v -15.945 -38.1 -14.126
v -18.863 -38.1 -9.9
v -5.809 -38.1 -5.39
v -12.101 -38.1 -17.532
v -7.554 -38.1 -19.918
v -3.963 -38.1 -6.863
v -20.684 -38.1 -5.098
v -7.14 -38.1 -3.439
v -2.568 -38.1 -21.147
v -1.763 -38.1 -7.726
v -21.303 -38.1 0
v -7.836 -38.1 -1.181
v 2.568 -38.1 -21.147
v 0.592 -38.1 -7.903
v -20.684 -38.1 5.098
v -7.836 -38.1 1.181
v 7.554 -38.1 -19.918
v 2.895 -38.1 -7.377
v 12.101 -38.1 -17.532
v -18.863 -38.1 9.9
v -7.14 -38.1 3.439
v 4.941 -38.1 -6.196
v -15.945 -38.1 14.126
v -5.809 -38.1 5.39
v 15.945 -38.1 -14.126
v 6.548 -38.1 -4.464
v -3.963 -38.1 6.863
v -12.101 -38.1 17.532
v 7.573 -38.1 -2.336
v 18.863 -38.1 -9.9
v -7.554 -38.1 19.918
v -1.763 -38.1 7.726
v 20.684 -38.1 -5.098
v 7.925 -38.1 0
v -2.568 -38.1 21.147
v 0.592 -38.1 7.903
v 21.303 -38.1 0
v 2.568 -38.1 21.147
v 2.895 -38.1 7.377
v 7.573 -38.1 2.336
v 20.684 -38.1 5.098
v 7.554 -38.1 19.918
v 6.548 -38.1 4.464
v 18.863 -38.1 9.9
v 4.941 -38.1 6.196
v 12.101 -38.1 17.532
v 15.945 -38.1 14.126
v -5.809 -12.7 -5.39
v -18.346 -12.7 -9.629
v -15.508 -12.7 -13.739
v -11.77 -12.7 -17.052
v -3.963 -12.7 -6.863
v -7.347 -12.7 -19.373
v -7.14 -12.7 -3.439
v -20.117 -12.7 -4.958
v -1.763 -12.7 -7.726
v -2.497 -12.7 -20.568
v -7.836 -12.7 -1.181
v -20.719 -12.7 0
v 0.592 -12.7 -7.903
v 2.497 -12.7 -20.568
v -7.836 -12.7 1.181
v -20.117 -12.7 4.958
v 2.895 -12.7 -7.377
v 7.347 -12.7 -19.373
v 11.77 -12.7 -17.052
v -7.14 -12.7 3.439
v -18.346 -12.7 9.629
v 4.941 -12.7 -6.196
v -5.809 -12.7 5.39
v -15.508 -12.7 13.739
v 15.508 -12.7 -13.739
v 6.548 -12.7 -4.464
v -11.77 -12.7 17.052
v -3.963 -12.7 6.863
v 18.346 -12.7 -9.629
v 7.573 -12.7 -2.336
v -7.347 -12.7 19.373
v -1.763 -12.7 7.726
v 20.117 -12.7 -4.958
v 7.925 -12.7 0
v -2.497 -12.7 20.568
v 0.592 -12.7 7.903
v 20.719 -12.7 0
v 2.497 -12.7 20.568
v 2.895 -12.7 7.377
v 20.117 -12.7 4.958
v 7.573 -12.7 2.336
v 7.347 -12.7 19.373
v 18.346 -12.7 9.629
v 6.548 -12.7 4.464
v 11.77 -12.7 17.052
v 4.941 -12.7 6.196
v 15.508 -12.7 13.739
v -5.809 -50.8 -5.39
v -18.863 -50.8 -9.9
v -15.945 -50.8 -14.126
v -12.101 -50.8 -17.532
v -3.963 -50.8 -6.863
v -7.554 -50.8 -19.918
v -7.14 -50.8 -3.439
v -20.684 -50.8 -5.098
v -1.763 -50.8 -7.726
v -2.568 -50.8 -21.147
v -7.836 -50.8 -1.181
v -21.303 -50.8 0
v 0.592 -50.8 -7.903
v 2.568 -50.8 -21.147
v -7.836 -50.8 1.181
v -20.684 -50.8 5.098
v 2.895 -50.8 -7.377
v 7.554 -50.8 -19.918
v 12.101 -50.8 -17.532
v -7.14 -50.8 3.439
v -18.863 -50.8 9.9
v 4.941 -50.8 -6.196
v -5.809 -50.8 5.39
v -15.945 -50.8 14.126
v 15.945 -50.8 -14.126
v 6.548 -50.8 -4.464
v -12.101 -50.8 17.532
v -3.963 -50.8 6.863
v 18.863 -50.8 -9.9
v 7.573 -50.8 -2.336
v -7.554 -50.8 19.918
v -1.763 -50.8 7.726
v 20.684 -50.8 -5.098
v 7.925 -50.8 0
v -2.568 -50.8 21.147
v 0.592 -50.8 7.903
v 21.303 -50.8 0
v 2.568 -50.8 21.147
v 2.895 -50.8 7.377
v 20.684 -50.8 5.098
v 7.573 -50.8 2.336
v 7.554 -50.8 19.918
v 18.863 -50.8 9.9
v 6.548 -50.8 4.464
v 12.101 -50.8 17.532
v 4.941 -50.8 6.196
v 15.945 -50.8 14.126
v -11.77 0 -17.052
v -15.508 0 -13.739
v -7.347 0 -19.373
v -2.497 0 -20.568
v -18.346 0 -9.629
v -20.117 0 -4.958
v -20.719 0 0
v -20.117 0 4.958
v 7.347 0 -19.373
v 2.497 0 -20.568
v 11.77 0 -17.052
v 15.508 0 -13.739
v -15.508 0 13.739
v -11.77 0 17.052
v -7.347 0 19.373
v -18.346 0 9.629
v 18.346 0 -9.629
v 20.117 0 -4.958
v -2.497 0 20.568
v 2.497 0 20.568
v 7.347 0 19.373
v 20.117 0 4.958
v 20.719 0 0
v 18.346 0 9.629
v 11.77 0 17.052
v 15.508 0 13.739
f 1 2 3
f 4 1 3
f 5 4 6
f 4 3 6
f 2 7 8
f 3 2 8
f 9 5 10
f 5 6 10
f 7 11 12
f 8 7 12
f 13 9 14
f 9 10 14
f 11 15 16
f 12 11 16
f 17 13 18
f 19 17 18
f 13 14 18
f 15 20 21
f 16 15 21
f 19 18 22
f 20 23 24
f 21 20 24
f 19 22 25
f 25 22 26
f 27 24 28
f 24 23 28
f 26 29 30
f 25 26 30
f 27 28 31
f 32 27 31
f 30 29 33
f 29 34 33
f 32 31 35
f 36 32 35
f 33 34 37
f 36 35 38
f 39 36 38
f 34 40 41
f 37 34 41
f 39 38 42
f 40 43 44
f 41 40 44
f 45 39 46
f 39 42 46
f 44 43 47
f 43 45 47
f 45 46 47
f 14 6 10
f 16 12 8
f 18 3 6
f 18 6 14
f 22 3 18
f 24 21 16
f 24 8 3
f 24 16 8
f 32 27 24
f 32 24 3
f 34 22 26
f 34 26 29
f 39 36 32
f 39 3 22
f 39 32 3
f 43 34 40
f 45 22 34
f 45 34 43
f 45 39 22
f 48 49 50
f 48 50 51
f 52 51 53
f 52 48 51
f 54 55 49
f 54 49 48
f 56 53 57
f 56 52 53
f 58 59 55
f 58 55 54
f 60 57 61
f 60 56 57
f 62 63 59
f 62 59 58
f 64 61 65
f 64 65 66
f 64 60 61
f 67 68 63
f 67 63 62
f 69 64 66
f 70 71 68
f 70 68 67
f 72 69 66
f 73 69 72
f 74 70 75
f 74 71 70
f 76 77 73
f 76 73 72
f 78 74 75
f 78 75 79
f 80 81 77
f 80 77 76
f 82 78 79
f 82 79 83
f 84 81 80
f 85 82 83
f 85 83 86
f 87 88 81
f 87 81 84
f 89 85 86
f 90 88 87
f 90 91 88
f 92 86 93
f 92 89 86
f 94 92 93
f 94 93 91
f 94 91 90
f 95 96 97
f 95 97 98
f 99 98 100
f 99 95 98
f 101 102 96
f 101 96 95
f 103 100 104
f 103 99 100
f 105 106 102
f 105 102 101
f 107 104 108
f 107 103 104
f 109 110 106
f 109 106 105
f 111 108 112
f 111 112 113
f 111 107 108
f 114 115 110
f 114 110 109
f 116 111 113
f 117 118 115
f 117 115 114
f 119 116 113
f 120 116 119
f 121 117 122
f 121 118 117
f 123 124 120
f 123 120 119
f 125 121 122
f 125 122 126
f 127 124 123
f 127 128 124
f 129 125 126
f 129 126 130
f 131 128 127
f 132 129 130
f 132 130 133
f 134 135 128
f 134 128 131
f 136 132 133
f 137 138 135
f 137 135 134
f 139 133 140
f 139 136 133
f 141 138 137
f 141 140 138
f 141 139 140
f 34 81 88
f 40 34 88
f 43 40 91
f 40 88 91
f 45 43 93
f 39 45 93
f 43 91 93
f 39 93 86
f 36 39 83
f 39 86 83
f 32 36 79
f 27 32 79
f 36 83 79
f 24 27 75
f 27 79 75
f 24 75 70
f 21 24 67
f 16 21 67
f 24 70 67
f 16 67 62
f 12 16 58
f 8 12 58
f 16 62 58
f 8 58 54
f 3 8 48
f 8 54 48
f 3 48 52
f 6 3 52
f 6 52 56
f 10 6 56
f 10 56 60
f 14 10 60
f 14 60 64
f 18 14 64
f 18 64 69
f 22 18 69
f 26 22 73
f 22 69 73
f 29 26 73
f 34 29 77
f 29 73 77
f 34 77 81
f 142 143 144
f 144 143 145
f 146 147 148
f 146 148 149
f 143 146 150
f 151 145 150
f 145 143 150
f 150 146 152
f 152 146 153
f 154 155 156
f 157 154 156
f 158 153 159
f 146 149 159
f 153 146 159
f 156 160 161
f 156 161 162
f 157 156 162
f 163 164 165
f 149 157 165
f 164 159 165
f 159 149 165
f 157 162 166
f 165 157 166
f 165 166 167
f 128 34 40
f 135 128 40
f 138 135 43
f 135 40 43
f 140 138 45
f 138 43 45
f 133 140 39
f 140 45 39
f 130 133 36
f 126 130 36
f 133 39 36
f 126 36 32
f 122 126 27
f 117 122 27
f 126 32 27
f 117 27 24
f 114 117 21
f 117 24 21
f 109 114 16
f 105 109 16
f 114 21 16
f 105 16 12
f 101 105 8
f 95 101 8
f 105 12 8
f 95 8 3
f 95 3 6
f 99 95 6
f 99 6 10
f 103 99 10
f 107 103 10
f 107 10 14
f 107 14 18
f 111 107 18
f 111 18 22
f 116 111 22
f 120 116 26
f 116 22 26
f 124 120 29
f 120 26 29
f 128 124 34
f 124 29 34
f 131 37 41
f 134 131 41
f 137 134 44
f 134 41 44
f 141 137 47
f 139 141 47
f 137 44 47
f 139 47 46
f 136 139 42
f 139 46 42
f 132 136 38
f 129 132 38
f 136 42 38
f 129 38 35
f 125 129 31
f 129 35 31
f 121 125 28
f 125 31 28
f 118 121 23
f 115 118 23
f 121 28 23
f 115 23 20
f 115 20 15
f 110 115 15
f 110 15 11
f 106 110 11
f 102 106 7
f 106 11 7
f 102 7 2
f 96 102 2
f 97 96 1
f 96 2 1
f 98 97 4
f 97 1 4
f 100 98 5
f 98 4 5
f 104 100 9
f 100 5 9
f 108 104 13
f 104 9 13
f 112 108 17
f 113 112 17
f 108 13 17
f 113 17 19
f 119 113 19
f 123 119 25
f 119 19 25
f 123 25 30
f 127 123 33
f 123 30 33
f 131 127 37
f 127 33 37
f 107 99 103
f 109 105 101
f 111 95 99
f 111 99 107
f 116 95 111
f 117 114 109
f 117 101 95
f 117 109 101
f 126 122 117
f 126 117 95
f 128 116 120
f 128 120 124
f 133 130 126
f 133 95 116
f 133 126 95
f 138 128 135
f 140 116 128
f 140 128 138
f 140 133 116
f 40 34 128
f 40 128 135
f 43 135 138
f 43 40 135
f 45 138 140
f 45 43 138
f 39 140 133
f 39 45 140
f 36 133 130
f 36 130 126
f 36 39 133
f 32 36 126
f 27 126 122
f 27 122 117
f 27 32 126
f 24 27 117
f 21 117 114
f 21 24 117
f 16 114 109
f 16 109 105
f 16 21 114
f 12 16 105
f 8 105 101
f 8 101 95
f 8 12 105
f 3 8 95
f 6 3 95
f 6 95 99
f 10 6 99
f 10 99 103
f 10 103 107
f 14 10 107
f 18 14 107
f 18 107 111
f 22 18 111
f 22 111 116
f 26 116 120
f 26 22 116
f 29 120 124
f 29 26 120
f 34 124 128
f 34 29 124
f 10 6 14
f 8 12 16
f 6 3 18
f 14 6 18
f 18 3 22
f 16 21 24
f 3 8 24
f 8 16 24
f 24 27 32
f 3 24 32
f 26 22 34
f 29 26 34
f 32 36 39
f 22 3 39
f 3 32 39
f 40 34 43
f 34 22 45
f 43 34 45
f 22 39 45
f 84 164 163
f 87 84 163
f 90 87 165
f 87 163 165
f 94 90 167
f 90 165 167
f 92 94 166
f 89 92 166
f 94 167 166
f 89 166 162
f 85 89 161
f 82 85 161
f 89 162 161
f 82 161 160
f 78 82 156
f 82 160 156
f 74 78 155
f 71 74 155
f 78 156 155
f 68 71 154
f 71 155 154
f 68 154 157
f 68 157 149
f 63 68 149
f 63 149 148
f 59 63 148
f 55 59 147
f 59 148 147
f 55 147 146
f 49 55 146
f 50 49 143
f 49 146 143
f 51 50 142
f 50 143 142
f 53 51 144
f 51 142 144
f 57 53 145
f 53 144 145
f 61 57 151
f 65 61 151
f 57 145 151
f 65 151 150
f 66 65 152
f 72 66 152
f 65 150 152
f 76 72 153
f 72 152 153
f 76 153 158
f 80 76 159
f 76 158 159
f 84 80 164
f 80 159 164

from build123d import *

# Parameters (mm, degrees)
F0_R      = 20.719134
F1_DEPTH  = 12.7
F2_R      = 7.925002
F3_DEPTH  = 25.4
F4_R      = 21.302691
F4_R_2    = 7.925002
F5_DEPTH  = 12.7
F3_FACE_R = 7.925002
F6_DEPTH  = 12.7


with BuildPart() as f1:
    # F0 (on Front) → F1 (new body)
    with BuildSketch(Plane.XZ):
        Circle(F0_R)
    extrude(amount=F1_DEPTH)

    # F2 (on face) → F3 (join)
    with BuildSketch(Plane.XZ.offset(12.7)):
        Circle(F2_R)
    extrude(amount=F3_DEPTH)


with BuildPart() as f5:
    # F4 (on face) → F5 (new body)
    with BuildSketch(Plane.XZ.offset(38.1)):
        Circle(F4_R)
        Circle(F4_R_2, mode=Mode.SUBTRACT)
    extrude(amount=F5_DEPTH)


with BuildPart() as f6:
    # F3_face (on face) → F6 (new body)
    with BuildSketch(Plane.XZ.offset(38.1)):
        Circle(F3_FACE_R)
    extrude(amount=F6_DEPTH)


solid = Compound([f1.part, f5.part, f6.part])
